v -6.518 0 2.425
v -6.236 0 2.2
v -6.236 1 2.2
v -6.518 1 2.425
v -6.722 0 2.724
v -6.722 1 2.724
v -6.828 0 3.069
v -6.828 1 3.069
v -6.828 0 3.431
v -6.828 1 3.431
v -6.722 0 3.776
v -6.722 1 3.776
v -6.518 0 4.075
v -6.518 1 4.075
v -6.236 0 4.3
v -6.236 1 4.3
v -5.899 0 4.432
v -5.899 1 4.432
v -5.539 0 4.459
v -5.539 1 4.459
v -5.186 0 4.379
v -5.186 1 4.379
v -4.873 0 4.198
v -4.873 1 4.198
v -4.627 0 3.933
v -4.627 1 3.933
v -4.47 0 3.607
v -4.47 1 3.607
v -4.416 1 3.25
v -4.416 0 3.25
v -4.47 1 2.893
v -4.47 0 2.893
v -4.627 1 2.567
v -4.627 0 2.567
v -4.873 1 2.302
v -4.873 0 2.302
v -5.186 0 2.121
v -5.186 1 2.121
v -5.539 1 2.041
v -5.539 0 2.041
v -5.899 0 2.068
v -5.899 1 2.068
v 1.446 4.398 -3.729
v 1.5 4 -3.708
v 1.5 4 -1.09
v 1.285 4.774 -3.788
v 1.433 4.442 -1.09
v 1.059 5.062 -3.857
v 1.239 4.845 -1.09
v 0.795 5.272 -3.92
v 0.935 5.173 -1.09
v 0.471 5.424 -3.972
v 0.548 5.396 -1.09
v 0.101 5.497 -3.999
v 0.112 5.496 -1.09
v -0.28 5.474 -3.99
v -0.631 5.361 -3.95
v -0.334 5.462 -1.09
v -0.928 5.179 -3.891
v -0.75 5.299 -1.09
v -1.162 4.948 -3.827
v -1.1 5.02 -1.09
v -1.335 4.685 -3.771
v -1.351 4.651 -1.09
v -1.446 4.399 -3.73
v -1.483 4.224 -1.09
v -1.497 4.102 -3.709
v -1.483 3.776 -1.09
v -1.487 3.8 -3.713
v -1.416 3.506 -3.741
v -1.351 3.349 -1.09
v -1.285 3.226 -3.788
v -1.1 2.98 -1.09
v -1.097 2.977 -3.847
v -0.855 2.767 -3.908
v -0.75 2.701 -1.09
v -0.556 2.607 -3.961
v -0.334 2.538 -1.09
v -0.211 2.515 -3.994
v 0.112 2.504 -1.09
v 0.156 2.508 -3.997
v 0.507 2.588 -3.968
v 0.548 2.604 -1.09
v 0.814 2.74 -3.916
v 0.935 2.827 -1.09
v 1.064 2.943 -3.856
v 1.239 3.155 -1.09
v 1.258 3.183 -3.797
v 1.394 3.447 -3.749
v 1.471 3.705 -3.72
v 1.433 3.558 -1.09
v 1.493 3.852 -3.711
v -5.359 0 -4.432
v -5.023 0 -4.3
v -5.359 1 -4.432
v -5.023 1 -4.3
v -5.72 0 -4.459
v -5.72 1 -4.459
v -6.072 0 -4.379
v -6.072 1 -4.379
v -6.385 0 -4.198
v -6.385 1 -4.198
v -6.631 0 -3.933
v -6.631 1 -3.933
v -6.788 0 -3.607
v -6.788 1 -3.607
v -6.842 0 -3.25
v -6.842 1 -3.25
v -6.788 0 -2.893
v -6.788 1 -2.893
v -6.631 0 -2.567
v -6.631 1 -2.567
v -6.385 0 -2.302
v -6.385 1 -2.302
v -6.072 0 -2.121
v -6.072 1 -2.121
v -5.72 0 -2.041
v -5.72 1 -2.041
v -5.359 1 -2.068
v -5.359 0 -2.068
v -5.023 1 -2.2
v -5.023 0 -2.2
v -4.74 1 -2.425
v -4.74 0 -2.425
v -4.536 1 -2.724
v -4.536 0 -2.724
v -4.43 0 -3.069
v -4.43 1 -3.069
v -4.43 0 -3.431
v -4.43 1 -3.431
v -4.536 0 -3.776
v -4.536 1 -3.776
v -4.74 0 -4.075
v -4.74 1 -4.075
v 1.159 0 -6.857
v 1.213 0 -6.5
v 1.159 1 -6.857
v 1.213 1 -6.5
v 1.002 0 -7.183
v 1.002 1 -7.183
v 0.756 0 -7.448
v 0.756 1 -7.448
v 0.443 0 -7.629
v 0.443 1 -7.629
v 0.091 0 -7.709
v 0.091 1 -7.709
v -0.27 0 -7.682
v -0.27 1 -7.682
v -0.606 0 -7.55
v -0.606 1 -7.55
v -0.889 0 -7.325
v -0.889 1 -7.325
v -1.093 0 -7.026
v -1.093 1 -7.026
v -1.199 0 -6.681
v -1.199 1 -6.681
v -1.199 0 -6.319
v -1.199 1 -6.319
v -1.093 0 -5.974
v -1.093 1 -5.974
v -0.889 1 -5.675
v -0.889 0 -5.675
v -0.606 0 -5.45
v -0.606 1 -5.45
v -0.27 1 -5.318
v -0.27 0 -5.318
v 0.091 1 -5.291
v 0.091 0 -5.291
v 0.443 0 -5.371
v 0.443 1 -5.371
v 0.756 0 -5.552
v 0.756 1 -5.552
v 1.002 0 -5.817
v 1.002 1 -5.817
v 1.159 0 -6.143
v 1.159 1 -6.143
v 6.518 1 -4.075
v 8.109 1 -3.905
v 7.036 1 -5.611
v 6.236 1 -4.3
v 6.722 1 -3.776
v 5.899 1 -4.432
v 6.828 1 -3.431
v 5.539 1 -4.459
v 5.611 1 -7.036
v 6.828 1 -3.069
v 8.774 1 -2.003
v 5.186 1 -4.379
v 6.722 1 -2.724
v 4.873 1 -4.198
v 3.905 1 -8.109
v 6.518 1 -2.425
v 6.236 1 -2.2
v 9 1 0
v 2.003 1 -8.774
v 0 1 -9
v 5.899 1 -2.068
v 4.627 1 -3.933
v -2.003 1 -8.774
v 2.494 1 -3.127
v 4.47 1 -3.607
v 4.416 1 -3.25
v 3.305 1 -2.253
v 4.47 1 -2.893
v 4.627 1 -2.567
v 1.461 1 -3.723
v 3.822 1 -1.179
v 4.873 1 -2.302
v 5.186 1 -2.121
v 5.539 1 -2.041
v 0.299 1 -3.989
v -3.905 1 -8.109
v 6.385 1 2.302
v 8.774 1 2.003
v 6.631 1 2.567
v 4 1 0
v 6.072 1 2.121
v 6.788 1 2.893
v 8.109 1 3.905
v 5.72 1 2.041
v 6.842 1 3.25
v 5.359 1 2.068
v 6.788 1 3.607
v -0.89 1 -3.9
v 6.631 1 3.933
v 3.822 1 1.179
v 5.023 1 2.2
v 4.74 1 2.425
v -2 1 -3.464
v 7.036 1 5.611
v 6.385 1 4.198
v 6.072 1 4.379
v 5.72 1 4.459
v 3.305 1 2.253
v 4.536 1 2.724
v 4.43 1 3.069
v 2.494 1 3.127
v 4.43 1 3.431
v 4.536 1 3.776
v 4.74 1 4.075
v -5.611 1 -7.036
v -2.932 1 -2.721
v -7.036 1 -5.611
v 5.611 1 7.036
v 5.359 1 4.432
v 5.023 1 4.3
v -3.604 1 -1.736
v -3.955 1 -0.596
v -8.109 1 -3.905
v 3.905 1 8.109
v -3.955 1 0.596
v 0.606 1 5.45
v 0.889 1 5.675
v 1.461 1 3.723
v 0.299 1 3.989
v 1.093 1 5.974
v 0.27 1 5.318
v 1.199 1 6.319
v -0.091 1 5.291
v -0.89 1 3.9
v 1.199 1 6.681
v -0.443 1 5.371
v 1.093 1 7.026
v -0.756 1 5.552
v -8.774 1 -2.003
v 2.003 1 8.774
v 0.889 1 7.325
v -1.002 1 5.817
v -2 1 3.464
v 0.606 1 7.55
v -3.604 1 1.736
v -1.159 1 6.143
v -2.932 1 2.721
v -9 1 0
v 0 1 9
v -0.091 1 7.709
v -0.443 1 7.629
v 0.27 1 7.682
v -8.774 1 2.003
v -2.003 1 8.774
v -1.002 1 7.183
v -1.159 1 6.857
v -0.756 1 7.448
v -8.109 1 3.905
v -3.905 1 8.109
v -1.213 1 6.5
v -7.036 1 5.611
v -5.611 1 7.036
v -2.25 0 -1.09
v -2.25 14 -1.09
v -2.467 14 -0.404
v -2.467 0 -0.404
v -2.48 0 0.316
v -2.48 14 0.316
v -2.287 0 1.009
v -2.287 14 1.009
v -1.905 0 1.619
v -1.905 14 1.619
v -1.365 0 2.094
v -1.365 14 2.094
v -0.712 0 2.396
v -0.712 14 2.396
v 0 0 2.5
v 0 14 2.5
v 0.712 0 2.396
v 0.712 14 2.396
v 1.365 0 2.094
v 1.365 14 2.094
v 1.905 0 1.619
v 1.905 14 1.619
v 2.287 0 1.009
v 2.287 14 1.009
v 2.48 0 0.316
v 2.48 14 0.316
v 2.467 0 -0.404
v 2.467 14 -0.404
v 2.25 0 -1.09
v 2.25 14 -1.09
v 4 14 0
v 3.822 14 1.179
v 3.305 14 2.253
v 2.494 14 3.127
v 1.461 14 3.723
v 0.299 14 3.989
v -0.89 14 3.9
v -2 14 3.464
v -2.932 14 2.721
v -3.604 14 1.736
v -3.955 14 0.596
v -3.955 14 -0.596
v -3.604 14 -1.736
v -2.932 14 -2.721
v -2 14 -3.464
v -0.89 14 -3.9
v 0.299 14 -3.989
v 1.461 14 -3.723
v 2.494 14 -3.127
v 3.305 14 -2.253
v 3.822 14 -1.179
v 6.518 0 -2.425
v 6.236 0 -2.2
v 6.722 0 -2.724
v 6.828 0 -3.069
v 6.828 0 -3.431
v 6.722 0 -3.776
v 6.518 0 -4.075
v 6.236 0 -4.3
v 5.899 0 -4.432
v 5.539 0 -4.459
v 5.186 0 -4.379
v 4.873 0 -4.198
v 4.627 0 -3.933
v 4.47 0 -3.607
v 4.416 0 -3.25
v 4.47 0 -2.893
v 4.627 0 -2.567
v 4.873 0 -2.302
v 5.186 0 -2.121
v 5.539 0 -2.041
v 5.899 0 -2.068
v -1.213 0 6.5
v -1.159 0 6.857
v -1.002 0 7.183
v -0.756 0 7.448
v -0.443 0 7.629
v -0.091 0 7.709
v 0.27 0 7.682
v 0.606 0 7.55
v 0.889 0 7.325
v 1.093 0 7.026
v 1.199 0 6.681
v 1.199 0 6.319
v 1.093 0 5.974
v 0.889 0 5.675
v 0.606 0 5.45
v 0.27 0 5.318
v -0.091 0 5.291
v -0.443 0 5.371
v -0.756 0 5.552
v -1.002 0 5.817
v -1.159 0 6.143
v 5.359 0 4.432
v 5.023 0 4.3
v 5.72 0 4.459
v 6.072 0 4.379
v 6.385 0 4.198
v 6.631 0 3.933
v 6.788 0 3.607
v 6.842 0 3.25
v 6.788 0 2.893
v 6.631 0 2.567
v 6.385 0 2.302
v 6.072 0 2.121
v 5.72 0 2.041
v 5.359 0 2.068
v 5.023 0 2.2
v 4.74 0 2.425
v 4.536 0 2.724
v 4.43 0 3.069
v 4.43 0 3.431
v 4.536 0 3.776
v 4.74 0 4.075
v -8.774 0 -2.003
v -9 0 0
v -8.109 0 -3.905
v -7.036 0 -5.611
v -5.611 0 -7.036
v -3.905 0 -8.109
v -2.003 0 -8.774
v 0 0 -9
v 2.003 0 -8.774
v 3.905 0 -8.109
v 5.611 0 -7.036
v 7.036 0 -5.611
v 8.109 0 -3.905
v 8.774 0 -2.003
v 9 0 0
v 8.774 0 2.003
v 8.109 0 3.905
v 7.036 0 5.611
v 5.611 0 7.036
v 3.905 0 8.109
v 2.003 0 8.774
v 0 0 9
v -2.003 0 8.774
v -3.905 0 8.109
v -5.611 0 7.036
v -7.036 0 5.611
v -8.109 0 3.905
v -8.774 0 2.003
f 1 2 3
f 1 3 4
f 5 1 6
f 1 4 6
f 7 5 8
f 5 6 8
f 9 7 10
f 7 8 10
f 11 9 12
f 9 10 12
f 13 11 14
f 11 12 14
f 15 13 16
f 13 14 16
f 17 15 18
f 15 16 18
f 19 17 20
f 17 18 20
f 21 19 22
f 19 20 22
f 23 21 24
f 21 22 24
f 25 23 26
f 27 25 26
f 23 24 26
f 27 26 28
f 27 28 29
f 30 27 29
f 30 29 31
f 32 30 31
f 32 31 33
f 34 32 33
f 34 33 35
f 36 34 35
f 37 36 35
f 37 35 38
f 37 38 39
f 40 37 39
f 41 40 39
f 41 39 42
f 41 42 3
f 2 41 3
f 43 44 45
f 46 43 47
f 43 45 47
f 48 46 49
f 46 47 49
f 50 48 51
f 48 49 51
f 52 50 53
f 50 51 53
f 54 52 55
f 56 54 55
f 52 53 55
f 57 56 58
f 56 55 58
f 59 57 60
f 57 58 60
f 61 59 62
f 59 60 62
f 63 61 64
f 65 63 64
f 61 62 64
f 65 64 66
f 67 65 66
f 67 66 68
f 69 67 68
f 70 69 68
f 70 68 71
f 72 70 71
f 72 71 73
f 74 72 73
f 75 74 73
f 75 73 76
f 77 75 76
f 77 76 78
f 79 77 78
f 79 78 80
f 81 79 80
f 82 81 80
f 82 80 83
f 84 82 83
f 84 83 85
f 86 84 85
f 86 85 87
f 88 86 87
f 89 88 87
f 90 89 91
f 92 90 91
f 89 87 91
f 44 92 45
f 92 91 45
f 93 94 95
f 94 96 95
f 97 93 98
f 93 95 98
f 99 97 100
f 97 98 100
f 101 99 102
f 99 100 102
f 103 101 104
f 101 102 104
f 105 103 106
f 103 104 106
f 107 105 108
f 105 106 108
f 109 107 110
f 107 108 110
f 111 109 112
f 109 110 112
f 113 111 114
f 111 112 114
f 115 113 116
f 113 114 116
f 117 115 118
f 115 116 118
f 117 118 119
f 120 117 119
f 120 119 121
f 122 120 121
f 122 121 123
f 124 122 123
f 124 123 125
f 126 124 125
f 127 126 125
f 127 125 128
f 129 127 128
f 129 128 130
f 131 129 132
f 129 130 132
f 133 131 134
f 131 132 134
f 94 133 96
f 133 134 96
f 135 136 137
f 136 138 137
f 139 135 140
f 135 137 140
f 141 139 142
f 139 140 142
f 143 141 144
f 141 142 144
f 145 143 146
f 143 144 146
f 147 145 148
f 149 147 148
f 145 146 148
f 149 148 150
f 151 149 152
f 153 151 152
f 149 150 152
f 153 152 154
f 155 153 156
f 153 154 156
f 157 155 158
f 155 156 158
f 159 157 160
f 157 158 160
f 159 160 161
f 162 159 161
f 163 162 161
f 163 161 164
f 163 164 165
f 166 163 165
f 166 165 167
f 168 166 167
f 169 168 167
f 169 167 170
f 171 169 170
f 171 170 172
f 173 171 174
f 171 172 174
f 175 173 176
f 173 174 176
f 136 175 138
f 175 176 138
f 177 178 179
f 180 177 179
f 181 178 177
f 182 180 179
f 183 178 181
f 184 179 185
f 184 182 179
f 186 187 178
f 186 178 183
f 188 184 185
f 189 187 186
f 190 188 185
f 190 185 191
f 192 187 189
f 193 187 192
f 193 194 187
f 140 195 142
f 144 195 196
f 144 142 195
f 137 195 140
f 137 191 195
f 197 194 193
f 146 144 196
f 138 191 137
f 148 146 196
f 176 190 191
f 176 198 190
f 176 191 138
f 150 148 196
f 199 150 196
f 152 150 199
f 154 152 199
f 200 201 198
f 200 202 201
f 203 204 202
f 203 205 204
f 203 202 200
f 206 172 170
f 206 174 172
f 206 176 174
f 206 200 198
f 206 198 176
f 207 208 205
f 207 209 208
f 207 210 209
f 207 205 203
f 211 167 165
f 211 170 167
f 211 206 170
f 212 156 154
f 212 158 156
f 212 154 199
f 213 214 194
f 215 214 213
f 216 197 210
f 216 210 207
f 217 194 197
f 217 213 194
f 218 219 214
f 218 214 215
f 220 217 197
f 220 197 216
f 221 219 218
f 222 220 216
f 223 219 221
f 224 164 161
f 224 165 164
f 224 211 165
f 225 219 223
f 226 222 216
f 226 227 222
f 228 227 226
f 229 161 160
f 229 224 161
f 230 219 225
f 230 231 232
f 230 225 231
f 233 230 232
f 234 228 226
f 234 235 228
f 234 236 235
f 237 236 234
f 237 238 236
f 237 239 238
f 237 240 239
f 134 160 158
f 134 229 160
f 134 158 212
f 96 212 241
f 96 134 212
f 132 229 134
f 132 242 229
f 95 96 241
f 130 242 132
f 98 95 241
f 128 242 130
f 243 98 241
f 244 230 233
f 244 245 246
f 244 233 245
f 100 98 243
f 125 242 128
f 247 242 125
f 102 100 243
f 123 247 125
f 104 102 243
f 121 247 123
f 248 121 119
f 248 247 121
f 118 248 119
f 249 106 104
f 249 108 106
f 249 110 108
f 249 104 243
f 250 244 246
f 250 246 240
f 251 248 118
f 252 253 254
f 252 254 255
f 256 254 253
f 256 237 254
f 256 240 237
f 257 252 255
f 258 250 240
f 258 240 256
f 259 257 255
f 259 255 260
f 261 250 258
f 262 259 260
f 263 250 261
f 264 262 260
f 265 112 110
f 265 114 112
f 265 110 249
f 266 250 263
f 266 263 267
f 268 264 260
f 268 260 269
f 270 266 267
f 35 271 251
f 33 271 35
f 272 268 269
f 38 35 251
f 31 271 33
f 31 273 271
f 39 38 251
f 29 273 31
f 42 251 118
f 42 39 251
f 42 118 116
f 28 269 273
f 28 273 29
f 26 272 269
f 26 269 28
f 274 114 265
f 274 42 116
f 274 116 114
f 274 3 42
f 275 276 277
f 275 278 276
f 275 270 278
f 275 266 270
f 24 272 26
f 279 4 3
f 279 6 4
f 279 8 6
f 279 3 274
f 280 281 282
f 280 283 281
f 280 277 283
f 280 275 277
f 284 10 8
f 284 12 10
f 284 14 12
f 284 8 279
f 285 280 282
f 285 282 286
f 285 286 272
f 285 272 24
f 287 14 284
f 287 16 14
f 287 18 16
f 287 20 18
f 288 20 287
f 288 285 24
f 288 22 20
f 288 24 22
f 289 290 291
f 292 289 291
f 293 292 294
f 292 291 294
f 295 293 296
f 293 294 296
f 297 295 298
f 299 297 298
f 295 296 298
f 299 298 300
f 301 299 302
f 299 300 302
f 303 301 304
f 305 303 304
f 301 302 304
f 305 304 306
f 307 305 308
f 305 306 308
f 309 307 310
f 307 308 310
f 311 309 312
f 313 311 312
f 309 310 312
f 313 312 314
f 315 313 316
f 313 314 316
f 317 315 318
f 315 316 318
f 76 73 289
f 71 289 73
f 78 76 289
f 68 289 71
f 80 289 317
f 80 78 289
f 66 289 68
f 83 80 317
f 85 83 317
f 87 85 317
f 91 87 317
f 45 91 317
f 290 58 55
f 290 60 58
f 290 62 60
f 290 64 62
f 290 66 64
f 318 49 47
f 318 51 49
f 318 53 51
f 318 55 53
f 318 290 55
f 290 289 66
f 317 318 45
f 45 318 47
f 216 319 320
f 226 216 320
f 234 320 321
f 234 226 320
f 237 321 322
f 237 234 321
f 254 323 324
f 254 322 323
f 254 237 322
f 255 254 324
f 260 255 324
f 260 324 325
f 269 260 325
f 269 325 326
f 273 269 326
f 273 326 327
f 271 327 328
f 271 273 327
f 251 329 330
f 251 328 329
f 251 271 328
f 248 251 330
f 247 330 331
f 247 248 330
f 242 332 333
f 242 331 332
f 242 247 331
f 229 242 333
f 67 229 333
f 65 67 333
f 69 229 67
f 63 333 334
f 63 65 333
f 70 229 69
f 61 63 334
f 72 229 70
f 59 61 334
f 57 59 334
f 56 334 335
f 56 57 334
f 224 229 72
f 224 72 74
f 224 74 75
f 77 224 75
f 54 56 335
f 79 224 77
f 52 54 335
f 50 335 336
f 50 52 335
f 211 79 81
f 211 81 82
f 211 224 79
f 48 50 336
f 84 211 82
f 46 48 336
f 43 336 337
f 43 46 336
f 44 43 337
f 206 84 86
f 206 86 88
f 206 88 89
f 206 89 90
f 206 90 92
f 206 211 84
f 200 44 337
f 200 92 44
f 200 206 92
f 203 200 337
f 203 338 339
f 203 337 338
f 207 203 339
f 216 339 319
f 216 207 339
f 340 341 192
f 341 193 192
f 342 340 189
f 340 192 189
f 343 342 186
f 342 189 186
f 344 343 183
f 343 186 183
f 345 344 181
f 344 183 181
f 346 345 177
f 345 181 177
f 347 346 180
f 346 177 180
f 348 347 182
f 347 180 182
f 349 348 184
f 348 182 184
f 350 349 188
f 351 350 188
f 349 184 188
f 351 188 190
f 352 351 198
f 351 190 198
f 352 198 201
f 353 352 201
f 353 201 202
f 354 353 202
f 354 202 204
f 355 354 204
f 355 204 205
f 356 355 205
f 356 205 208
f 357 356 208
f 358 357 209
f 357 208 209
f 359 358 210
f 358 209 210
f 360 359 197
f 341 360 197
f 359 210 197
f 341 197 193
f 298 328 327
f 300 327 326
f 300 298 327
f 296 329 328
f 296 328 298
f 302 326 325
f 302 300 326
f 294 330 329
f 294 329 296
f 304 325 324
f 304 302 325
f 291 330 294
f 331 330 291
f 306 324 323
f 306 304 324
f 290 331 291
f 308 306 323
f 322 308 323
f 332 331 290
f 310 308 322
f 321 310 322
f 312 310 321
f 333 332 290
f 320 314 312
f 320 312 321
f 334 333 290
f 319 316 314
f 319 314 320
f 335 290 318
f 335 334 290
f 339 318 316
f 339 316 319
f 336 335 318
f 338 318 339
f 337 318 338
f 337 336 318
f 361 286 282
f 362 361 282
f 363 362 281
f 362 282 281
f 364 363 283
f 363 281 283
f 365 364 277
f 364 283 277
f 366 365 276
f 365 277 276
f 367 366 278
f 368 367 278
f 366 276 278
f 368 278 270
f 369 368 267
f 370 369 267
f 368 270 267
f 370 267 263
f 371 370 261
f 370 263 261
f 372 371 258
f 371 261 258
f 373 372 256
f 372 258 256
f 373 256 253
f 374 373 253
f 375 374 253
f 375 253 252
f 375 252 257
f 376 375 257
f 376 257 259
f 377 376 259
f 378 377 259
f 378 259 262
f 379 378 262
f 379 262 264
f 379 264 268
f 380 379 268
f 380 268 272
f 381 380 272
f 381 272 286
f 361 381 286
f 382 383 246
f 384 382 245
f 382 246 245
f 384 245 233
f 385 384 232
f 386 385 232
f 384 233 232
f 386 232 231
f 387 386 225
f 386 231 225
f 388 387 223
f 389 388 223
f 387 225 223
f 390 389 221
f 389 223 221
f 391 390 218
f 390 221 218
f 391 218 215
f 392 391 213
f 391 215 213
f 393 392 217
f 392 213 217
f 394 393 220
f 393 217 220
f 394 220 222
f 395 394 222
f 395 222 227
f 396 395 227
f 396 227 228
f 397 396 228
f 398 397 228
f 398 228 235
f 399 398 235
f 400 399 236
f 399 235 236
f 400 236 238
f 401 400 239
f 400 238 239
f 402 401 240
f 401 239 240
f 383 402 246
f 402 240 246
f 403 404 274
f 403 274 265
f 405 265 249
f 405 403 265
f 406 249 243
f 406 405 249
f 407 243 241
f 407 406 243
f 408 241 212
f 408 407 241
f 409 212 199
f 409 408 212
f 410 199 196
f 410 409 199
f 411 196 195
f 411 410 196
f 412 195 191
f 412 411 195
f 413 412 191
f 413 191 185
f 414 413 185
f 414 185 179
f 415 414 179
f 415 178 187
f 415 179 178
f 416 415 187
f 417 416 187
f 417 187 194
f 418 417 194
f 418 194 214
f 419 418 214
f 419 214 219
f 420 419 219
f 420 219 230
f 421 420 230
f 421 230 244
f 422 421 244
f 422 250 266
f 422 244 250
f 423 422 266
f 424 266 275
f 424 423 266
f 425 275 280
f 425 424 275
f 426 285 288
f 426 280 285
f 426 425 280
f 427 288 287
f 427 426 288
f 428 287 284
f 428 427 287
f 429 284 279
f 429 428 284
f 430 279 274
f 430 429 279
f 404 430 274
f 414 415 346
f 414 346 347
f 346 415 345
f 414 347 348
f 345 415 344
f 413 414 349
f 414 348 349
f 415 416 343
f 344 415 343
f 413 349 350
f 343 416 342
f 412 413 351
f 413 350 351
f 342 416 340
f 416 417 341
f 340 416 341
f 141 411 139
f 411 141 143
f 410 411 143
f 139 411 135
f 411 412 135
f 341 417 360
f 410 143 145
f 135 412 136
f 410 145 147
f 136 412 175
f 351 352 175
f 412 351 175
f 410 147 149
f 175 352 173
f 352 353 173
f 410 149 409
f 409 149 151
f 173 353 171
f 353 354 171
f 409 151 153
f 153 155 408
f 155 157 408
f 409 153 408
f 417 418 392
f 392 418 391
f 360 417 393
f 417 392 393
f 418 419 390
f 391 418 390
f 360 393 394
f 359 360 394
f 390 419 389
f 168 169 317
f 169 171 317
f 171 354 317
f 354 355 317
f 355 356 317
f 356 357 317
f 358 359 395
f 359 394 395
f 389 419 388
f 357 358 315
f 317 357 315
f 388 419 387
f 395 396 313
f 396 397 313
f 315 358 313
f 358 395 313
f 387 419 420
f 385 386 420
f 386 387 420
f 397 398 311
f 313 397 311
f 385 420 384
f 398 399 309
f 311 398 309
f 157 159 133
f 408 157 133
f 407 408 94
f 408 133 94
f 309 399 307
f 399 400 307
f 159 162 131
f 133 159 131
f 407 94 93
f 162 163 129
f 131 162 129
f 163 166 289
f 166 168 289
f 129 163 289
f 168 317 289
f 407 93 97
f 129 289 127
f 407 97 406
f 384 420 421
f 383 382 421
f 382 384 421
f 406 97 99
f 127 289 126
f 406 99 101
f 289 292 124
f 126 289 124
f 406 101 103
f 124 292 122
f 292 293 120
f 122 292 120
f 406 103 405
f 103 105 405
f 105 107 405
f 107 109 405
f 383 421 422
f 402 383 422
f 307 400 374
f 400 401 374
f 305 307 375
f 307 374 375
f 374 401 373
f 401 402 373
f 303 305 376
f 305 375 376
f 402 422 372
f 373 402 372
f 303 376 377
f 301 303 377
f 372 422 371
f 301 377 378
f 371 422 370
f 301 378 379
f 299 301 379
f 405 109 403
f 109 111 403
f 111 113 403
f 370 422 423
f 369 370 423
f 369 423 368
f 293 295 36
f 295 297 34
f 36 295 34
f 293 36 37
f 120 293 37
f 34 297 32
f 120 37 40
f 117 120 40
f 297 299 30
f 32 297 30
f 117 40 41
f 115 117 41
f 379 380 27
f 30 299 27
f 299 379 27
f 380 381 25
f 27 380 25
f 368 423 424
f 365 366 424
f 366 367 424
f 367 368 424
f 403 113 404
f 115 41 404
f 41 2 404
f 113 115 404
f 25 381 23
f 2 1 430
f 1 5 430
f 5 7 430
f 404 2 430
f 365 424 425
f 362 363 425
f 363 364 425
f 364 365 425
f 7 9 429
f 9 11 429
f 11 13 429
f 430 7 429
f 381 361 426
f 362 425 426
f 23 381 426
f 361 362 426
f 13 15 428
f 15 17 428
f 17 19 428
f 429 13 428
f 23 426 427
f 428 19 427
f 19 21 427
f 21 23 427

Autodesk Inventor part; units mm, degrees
ref_plane "YZ Plane" through (0, 0, 0) normal (1, 0, 0) x (0, 1, 0)
ref_plane "XZ Plane" through (0, 0, 0) normal (0, 1, 0) x (-1, 0, 0)
ref_plane "XY Plane" through (0, 0, 0) normal (0, 0, 1) x (1, 0, 0)
sketch "Esquisse1" plane through (0, 0, 0) normal (0, 1, 0) x (-1, 0, 0)
  circle A0 centre (0, 0) radius 9
  dimension "d0" = 18
extrude "Extrusion1" add sketch "Esquisse1" along normal blind 1
sketch "Esquisse2" plane through (0, 1, 0) normal (0, 1, 0) x (1, 0, 0)
  circle A0 centre (0, 0) radius 9 projected
  circle A1 centre (0, 0) radius 4
  dimension "d3" = 8
extrude "Extrusion2" add sketch "Esquisse2" along normal blind 13 contours A1
sketch "Esquisse3" plane through (0, 14, 0) normal (0, 1, 0) x (1, 0, 0)
  circle A0 centre (0, 0) radius 4 projected
  arc A1 (-2.25, 1.0897) -> (2.25, 1.0897) centre (0, 0) ccw
  line L0 (-2.25, 1.0897) -> (2.25, 1.0897)
  arc A2 (2.25, 1.0897) -> (-2.25, 1.0897) centre (0, 0) ccw
  dimension "d6" = 5
  dimension "d10" = 4.5
extrude "Extrusion3" cut sketch "Esquisse3" against normal through all contours L0 A1
sketch "Esquisse4" plane through (-2.25, 14, -1.0897) normal (0, 0, 1) x (1, 0, 0)
  line L0 (0, 0) -> (4.5, 0) projected
  line L1 (2.25, -14) -> (2.25, 0) construction
  circle A0 centre (2.25, -10) radius 1.5
  dimension "d11" = 4
  dimension "d12" = 3
extrude "Extrusion4" cut sketch "Esquisse4" against normal up to next
sketch "Esquisse5" plane through (0, 1, 0) normal (0, 1, 0) x (1, 0, 0)
  circle A0 centre (0, 0) radius 4 projected
  circle A1 centre (0, 0) radius 9 projected
  line L0 (0, 0) -> (0, 9) construction
  circle A2 centre (0, 6.5) radius 1.2128
  dimension "d15" = 2.4255
  dimension "d16" = 6.5
extrude "Extrusion5" cut sketch "Esquisse5" against normal up to next contours A2
pattern_circular "Réseau circulaire1" count 6 over 360 about axis through (0, -10, 0) along (0, 1, 0) of "Extrusion5"
thread "Filetage1" size "M3x0.5" class "6H" standard "ANSI Metric M Profile" full length
properties part number "axe_roue_moteur"
